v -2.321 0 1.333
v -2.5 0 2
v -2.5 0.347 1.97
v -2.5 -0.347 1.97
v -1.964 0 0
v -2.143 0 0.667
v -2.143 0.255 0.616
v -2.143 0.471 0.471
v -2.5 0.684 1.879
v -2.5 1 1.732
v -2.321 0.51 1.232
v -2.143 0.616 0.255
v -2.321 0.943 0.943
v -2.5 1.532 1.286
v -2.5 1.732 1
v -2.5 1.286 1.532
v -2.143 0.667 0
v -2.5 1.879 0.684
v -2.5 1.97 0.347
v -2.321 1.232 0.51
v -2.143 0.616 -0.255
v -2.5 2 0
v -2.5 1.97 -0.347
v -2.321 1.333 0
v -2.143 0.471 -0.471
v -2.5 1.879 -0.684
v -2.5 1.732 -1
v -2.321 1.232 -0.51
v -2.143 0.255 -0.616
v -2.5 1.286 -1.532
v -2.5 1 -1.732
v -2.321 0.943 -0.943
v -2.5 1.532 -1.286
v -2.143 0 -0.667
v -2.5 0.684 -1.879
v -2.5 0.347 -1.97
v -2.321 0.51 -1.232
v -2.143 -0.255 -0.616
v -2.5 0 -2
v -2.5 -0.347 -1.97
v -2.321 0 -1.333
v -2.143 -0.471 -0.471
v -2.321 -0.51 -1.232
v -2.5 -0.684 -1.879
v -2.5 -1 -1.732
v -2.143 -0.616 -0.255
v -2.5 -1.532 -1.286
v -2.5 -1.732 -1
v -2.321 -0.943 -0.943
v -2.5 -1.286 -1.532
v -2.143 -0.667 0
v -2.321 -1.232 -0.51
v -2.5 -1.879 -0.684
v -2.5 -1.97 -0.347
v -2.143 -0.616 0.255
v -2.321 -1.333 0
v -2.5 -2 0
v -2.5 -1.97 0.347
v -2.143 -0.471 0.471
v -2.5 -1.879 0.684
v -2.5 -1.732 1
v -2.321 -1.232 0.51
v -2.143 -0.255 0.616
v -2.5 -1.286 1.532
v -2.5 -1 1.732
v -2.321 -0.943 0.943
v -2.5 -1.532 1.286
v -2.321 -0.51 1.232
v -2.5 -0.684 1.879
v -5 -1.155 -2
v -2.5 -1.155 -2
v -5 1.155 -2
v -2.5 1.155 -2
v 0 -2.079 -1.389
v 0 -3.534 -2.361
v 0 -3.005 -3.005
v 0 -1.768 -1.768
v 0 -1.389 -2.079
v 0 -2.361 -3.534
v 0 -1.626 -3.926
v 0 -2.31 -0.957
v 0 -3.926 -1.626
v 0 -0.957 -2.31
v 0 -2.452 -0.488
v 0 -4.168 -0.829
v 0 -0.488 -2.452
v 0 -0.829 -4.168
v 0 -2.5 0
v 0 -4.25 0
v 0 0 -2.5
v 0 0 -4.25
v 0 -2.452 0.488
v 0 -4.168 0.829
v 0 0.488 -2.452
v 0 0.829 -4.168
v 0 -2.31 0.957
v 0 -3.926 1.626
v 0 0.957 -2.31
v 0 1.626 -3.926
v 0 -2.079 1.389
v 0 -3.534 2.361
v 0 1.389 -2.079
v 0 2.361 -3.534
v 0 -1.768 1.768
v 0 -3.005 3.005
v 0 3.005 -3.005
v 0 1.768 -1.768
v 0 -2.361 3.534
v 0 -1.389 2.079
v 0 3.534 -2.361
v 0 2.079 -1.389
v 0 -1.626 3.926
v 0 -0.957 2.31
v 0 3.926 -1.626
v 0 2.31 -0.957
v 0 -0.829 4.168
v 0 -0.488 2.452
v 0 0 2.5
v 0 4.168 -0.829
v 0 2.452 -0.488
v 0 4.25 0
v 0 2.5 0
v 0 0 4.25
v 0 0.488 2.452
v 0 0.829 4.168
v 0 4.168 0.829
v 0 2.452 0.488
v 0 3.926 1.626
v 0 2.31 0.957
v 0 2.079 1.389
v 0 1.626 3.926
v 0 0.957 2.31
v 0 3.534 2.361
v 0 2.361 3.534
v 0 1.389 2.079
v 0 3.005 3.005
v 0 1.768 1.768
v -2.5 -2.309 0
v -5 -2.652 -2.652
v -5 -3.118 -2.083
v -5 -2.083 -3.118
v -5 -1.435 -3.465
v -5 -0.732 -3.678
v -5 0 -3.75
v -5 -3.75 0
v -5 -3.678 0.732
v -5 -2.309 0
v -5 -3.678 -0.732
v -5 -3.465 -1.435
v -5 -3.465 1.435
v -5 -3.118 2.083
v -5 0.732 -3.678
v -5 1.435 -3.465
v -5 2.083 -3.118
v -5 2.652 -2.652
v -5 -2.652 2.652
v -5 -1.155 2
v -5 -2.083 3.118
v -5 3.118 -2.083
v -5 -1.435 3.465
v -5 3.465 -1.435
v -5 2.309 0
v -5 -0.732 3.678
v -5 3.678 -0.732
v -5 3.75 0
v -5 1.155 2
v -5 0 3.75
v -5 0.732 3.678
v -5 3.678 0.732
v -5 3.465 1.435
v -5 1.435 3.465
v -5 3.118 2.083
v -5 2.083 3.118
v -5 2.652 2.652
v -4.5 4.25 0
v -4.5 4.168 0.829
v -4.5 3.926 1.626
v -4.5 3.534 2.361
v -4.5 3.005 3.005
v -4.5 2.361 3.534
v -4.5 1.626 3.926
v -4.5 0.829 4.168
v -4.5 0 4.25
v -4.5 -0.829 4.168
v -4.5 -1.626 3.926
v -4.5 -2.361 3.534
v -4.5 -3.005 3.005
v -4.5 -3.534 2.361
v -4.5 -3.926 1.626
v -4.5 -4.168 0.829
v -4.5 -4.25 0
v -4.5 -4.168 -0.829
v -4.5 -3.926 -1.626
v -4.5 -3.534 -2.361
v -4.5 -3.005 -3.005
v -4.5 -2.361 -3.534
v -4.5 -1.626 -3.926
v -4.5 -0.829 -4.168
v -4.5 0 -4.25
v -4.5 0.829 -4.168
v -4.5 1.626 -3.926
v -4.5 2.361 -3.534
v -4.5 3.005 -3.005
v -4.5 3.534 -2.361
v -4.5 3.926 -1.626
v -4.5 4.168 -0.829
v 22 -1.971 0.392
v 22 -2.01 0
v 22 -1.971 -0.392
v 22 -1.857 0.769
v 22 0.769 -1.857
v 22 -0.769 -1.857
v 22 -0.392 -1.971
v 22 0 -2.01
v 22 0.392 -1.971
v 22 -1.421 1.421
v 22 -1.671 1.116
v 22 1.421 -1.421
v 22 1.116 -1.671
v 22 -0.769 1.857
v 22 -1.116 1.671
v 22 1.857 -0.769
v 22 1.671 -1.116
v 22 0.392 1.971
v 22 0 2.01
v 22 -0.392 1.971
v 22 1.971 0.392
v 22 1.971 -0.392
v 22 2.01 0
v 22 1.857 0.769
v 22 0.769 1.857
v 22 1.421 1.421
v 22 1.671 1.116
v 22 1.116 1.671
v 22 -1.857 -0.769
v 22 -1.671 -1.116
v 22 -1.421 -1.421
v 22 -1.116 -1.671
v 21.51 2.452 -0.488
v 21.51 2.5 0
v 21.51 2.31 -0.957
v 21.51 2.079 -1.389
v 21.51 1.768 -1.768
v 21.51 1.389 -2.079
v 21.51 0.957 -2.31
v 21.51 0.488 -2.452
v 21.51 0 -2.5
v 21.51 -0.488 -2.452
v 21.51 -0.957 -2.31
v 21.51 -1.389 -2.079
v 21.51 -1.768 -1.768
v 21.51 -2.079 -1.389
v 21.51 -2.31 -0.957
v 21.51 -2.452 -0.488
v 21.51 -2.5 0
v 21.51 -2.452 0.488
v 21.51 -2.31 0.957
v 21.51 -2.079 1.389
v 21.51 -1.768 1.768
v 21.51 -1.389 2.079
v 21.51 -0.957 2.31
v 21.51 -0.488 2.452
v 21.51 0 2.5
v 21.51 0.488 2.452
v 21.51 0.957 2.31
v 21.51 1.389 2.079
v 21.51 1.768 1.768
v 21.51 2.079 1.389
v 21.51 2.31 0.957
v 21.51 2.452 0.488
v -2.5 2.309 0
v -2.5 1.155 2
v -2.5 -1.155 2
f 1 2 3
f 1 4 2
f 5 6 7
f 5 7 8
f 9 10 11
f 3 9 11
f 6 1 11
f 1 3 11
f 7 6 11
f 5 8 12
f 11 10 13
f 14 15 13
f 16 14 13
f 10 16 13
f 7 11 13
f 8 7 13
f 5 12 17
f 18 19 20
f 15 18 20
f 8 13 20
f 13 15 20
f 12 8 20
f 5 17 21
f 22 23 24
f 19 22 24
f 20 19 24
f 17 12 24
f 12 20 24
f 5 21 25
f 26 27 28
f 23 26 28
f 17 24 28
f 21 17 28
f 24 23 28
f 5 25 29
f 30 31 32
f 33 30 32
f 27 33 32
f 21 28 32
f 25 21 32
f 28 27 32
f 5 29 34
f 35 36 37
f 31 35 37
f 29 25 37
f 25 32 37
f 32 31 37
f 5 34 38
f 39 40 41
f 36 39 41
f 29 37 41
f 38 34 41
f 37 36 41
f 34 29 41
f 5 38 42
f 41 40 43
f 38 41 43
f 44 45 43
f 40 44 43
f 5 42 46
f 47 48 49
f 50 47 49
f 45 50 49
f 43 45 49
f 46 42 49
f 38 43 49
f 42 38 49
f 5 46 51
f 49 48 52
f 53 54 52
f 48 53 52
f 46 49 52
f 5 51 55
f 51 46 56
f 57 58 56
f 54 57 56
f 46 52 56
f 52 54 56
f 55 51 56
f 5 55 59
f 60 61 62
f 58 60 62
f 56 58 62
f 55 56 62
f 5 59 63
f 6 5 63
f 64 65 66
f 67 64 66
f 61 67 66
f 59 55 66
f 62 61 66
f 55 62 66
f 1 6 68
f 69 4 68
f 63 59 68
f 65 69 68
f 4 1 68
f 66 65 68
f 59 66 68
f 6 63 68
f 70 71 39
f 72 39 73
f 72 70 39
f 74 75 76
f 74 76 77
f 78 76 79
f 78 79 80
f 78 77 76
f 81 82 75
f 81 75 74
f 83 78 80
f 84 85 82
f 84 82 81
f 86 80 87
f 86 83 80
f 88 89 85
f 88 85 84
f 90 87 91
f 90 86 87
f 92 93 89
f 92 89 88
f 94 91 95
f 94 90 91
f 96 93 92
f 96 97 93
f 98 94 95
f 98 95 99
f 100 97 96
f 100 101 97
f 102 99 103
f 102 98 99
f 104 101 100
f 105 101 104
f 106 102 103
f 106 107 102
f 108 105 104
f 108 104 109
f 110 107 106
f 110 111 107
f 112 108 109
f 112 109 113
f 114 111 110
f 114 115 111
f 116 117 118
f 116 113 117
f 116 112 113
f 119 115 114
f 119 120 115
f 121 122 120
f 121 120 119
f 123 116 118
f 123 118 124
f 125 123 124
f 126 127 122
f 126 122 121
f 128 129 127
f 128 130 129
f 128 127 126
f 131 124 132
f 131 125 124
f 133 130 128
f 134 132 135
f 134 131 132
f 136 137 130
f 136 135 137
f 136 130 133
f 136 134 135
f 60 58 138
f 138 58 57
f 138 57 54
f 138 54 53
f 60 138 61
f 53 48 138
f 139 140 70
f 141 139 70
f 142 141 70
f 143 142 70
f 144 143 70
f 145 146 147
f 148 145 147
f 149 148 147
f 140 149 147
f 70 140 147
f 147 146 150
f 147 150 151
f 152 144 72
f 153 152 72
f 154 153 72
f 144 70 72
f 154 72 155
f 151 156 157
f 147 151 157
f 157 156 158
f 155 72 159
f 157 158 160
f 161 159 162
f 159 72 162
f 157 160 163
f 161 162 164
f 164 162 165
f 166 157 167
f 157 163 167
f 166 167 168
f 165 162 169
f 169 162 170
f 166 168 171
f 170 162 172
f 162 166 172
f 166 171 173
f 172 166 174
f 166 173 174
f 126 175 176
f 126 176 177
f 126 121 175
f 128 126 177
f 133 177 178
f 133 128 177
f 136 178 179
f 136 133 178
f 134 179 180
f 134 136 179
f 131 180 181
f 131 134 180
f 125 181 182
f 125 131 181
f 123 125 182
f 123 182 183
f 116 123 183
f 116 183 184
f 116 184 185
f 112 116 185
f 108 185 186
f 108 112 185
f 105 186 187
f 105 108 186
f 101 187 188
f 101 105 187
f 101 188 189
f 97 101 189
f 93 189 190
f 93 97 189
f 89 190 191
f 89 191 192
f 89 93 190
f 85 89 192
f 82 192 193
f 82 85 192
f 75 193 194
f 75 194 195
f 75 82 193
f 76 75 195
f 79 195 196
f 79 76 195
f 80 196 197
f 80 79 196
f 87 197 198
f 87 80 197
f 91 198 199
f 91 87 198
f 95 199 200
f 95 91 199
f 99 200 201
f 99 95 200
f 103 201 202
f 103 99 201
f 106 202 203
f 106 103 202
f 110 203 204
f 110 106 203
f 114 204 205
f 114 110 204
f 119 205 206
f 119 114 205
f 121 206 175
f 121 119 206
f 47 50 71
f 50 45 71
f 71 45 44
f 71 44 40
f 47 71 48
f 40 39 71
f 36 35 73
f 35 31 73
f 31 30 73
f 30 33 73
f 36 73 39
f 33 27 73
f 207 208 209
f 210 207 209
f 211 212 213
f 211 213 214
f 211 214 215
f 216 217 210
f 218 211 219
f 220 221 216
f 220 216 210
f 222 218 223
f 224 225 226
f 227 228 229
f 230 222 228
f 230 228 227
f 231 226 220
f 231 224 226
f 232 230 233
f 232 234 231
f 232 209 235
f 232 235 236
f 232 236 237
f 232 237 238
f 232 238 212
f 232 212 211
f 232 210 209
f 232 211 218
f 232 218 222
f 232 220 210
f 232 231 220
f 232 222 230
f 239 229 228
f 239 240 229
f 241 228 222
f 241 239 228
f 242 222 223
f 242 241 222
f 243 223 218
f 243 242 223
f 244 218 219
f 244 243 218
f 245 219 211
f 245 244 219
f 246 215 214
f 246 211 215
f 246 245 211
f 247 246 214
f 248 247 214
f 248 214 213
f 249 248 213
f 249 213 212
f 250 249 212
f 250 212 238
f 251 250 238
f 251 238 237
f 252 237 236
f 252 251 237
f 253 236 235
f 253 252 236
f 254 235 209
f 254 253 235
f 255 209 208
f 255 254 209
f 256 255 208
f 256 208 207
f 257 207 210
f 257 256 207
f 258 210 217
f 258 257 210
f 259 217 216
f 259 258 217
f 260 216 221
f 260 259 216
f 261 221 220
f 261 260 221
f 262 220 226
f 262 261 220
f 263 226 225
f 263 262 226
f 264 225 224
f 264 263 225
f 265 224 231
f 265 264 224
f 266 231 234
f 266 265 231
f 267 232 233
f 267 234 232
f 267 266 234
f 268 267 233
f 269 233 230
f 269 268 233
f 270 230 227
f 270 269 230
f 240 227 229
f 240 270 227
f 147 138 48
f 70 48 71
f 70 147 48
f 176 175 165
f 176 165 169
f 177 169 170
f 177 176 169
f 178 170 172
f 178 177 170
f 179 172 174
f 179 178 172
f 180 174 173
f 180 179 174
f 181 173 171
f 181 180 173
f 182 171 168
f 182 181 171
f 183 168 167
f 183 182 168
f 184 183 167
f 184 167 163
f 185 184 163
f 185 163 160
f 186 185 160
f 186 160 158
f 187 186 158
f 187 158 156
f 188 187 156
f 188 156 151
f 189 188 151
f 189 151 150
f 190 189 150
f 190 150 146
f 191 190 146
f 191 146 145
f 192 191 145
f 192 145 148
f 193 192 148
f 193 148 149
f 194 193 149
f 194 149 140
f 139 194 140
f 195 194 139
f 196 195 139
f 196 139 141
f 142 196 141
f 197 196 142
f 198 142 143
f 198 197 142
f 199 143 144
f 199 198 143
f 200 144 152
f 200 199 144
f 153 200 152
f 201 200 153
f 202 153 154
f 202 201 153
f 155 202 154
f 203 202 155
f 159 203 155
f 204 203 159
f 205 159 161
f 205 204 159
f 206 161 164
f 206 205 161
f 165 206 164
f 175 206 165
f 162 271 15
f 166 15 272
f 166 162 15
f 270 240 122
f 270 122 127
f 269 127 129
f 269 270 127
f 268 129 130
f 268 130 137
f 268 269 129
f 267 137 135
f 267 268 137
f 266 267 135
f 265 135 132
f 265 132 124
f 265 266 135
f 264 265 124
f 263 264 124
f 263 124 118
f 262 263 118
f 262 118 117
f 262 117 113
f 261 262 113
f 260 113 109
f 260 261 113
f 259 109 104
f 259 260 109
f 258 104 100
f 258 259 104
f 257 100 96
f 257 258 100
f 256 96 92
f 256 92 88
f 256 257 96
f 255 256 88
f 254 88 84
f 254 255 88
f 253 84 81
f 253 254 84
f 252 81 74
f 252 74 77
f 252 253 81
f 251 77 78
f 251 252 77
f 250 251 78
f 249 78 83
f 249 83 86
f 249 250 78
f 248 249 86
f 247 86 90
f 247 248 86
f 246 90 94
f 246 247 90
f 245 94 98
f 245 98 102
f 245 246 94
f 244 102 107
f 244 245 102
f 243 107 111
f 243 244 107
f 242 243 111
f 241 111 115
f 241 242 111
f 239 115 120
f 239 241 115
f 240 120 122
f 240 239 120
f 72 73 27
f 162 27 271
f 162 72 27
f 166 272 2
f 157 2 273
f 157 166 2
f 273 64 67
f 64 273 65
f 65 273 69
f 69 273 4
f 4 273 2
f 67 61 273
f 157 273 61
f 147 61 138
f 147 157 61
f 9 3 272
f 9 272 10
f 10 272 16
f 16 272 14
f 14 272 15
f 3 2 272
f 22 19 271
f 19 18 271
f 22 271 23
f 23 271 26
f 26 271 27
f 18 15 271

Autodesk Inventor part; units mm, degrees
sketch "Sketch_1" plane through (0, 0, 0) normal (0, 0, 1) x (1, 0, 0)
  line L0 (22, 0) -> (-5, 0)
  line L1 (-5, 0) -> (-5, 3.75)
  line L2 (-5, 3.75) -> (-4.5, 4.25)
  line L3 (-4.5, 4.25) -> (0, 4.25)
  line L4 (0, 4.25) -> (0, 2.5)
  line L5 (0, 2.5) -> (21.5095, 2.5)
  line L6 (21.5095, 2.5) -> (22, 2.0095)
  line L7 (22, 2.0095) -> (22, 0)
  line L8 (22, 0) -> (-5, 0)
revolve "Revolution1" add sketch "Sketch_1" angle 360 about axis through (22, 0, 0) along (1, 0, 0)
thread "Thread1" size "M5x0.8" class "6g" standard "ISO Metric profile" length 21.2 offset 0.8
sketch "Sketch2" plane through (-5, 0, 0) normal (-1, 0, 0) x (0, 0, 1)
  point P0 (0, 0)
hole "Hole1" at (-5, 0, 0) direction (1, 0, 0) diameter 4 depth 2.5 tip angle 150
sketch "Sketch_3" plane through (-5, 0, 0) normal (1, 0, 0) x (0, 0, -1)
  line L0 (-2, -1.1547) -> (0, -2.3094)
  line L1 (0, -2.3094) -> (2, -1.1547)
  line L2 (2, -1.1547) -> (2, 1.1547)
  line L3 (2, 1.1547) -> (0, 2.3094)
  line L4 (0, 2.3094) -> (-2, 1.1547)
  line L5 (-2, 1.1547) -> (-2, -1.1547)
extrude "Extrusion1" cut sketch "Sketch_3" along normal blind 2.5
ref_plane "bolt_XY" through (0, 0, 0) normal (1, 0, 0) x (0, 0, -1)
ref_plane "bolt_YZ" through (0, 0, 0) normal (0, 0, -1) x (0, 1, 0)
ref_plane "bolt_ZX" through (0, 0, 0) normal (0, 1, 0) x (1, 0, 0)
ref_plane "nut_XY" through (22, 0, 0) normal (1, 0, 0) x (0, 0, -1)
ref_plane "nut_YZ" through (22, 0, 0) normal (0, 0, -1) x (0, 1, 0)
ref_plane "nut_ZX" through (22, 0, 0) normal (0, 1, 0) x (1, 0, 0)
properties part number "SCB5-22"
